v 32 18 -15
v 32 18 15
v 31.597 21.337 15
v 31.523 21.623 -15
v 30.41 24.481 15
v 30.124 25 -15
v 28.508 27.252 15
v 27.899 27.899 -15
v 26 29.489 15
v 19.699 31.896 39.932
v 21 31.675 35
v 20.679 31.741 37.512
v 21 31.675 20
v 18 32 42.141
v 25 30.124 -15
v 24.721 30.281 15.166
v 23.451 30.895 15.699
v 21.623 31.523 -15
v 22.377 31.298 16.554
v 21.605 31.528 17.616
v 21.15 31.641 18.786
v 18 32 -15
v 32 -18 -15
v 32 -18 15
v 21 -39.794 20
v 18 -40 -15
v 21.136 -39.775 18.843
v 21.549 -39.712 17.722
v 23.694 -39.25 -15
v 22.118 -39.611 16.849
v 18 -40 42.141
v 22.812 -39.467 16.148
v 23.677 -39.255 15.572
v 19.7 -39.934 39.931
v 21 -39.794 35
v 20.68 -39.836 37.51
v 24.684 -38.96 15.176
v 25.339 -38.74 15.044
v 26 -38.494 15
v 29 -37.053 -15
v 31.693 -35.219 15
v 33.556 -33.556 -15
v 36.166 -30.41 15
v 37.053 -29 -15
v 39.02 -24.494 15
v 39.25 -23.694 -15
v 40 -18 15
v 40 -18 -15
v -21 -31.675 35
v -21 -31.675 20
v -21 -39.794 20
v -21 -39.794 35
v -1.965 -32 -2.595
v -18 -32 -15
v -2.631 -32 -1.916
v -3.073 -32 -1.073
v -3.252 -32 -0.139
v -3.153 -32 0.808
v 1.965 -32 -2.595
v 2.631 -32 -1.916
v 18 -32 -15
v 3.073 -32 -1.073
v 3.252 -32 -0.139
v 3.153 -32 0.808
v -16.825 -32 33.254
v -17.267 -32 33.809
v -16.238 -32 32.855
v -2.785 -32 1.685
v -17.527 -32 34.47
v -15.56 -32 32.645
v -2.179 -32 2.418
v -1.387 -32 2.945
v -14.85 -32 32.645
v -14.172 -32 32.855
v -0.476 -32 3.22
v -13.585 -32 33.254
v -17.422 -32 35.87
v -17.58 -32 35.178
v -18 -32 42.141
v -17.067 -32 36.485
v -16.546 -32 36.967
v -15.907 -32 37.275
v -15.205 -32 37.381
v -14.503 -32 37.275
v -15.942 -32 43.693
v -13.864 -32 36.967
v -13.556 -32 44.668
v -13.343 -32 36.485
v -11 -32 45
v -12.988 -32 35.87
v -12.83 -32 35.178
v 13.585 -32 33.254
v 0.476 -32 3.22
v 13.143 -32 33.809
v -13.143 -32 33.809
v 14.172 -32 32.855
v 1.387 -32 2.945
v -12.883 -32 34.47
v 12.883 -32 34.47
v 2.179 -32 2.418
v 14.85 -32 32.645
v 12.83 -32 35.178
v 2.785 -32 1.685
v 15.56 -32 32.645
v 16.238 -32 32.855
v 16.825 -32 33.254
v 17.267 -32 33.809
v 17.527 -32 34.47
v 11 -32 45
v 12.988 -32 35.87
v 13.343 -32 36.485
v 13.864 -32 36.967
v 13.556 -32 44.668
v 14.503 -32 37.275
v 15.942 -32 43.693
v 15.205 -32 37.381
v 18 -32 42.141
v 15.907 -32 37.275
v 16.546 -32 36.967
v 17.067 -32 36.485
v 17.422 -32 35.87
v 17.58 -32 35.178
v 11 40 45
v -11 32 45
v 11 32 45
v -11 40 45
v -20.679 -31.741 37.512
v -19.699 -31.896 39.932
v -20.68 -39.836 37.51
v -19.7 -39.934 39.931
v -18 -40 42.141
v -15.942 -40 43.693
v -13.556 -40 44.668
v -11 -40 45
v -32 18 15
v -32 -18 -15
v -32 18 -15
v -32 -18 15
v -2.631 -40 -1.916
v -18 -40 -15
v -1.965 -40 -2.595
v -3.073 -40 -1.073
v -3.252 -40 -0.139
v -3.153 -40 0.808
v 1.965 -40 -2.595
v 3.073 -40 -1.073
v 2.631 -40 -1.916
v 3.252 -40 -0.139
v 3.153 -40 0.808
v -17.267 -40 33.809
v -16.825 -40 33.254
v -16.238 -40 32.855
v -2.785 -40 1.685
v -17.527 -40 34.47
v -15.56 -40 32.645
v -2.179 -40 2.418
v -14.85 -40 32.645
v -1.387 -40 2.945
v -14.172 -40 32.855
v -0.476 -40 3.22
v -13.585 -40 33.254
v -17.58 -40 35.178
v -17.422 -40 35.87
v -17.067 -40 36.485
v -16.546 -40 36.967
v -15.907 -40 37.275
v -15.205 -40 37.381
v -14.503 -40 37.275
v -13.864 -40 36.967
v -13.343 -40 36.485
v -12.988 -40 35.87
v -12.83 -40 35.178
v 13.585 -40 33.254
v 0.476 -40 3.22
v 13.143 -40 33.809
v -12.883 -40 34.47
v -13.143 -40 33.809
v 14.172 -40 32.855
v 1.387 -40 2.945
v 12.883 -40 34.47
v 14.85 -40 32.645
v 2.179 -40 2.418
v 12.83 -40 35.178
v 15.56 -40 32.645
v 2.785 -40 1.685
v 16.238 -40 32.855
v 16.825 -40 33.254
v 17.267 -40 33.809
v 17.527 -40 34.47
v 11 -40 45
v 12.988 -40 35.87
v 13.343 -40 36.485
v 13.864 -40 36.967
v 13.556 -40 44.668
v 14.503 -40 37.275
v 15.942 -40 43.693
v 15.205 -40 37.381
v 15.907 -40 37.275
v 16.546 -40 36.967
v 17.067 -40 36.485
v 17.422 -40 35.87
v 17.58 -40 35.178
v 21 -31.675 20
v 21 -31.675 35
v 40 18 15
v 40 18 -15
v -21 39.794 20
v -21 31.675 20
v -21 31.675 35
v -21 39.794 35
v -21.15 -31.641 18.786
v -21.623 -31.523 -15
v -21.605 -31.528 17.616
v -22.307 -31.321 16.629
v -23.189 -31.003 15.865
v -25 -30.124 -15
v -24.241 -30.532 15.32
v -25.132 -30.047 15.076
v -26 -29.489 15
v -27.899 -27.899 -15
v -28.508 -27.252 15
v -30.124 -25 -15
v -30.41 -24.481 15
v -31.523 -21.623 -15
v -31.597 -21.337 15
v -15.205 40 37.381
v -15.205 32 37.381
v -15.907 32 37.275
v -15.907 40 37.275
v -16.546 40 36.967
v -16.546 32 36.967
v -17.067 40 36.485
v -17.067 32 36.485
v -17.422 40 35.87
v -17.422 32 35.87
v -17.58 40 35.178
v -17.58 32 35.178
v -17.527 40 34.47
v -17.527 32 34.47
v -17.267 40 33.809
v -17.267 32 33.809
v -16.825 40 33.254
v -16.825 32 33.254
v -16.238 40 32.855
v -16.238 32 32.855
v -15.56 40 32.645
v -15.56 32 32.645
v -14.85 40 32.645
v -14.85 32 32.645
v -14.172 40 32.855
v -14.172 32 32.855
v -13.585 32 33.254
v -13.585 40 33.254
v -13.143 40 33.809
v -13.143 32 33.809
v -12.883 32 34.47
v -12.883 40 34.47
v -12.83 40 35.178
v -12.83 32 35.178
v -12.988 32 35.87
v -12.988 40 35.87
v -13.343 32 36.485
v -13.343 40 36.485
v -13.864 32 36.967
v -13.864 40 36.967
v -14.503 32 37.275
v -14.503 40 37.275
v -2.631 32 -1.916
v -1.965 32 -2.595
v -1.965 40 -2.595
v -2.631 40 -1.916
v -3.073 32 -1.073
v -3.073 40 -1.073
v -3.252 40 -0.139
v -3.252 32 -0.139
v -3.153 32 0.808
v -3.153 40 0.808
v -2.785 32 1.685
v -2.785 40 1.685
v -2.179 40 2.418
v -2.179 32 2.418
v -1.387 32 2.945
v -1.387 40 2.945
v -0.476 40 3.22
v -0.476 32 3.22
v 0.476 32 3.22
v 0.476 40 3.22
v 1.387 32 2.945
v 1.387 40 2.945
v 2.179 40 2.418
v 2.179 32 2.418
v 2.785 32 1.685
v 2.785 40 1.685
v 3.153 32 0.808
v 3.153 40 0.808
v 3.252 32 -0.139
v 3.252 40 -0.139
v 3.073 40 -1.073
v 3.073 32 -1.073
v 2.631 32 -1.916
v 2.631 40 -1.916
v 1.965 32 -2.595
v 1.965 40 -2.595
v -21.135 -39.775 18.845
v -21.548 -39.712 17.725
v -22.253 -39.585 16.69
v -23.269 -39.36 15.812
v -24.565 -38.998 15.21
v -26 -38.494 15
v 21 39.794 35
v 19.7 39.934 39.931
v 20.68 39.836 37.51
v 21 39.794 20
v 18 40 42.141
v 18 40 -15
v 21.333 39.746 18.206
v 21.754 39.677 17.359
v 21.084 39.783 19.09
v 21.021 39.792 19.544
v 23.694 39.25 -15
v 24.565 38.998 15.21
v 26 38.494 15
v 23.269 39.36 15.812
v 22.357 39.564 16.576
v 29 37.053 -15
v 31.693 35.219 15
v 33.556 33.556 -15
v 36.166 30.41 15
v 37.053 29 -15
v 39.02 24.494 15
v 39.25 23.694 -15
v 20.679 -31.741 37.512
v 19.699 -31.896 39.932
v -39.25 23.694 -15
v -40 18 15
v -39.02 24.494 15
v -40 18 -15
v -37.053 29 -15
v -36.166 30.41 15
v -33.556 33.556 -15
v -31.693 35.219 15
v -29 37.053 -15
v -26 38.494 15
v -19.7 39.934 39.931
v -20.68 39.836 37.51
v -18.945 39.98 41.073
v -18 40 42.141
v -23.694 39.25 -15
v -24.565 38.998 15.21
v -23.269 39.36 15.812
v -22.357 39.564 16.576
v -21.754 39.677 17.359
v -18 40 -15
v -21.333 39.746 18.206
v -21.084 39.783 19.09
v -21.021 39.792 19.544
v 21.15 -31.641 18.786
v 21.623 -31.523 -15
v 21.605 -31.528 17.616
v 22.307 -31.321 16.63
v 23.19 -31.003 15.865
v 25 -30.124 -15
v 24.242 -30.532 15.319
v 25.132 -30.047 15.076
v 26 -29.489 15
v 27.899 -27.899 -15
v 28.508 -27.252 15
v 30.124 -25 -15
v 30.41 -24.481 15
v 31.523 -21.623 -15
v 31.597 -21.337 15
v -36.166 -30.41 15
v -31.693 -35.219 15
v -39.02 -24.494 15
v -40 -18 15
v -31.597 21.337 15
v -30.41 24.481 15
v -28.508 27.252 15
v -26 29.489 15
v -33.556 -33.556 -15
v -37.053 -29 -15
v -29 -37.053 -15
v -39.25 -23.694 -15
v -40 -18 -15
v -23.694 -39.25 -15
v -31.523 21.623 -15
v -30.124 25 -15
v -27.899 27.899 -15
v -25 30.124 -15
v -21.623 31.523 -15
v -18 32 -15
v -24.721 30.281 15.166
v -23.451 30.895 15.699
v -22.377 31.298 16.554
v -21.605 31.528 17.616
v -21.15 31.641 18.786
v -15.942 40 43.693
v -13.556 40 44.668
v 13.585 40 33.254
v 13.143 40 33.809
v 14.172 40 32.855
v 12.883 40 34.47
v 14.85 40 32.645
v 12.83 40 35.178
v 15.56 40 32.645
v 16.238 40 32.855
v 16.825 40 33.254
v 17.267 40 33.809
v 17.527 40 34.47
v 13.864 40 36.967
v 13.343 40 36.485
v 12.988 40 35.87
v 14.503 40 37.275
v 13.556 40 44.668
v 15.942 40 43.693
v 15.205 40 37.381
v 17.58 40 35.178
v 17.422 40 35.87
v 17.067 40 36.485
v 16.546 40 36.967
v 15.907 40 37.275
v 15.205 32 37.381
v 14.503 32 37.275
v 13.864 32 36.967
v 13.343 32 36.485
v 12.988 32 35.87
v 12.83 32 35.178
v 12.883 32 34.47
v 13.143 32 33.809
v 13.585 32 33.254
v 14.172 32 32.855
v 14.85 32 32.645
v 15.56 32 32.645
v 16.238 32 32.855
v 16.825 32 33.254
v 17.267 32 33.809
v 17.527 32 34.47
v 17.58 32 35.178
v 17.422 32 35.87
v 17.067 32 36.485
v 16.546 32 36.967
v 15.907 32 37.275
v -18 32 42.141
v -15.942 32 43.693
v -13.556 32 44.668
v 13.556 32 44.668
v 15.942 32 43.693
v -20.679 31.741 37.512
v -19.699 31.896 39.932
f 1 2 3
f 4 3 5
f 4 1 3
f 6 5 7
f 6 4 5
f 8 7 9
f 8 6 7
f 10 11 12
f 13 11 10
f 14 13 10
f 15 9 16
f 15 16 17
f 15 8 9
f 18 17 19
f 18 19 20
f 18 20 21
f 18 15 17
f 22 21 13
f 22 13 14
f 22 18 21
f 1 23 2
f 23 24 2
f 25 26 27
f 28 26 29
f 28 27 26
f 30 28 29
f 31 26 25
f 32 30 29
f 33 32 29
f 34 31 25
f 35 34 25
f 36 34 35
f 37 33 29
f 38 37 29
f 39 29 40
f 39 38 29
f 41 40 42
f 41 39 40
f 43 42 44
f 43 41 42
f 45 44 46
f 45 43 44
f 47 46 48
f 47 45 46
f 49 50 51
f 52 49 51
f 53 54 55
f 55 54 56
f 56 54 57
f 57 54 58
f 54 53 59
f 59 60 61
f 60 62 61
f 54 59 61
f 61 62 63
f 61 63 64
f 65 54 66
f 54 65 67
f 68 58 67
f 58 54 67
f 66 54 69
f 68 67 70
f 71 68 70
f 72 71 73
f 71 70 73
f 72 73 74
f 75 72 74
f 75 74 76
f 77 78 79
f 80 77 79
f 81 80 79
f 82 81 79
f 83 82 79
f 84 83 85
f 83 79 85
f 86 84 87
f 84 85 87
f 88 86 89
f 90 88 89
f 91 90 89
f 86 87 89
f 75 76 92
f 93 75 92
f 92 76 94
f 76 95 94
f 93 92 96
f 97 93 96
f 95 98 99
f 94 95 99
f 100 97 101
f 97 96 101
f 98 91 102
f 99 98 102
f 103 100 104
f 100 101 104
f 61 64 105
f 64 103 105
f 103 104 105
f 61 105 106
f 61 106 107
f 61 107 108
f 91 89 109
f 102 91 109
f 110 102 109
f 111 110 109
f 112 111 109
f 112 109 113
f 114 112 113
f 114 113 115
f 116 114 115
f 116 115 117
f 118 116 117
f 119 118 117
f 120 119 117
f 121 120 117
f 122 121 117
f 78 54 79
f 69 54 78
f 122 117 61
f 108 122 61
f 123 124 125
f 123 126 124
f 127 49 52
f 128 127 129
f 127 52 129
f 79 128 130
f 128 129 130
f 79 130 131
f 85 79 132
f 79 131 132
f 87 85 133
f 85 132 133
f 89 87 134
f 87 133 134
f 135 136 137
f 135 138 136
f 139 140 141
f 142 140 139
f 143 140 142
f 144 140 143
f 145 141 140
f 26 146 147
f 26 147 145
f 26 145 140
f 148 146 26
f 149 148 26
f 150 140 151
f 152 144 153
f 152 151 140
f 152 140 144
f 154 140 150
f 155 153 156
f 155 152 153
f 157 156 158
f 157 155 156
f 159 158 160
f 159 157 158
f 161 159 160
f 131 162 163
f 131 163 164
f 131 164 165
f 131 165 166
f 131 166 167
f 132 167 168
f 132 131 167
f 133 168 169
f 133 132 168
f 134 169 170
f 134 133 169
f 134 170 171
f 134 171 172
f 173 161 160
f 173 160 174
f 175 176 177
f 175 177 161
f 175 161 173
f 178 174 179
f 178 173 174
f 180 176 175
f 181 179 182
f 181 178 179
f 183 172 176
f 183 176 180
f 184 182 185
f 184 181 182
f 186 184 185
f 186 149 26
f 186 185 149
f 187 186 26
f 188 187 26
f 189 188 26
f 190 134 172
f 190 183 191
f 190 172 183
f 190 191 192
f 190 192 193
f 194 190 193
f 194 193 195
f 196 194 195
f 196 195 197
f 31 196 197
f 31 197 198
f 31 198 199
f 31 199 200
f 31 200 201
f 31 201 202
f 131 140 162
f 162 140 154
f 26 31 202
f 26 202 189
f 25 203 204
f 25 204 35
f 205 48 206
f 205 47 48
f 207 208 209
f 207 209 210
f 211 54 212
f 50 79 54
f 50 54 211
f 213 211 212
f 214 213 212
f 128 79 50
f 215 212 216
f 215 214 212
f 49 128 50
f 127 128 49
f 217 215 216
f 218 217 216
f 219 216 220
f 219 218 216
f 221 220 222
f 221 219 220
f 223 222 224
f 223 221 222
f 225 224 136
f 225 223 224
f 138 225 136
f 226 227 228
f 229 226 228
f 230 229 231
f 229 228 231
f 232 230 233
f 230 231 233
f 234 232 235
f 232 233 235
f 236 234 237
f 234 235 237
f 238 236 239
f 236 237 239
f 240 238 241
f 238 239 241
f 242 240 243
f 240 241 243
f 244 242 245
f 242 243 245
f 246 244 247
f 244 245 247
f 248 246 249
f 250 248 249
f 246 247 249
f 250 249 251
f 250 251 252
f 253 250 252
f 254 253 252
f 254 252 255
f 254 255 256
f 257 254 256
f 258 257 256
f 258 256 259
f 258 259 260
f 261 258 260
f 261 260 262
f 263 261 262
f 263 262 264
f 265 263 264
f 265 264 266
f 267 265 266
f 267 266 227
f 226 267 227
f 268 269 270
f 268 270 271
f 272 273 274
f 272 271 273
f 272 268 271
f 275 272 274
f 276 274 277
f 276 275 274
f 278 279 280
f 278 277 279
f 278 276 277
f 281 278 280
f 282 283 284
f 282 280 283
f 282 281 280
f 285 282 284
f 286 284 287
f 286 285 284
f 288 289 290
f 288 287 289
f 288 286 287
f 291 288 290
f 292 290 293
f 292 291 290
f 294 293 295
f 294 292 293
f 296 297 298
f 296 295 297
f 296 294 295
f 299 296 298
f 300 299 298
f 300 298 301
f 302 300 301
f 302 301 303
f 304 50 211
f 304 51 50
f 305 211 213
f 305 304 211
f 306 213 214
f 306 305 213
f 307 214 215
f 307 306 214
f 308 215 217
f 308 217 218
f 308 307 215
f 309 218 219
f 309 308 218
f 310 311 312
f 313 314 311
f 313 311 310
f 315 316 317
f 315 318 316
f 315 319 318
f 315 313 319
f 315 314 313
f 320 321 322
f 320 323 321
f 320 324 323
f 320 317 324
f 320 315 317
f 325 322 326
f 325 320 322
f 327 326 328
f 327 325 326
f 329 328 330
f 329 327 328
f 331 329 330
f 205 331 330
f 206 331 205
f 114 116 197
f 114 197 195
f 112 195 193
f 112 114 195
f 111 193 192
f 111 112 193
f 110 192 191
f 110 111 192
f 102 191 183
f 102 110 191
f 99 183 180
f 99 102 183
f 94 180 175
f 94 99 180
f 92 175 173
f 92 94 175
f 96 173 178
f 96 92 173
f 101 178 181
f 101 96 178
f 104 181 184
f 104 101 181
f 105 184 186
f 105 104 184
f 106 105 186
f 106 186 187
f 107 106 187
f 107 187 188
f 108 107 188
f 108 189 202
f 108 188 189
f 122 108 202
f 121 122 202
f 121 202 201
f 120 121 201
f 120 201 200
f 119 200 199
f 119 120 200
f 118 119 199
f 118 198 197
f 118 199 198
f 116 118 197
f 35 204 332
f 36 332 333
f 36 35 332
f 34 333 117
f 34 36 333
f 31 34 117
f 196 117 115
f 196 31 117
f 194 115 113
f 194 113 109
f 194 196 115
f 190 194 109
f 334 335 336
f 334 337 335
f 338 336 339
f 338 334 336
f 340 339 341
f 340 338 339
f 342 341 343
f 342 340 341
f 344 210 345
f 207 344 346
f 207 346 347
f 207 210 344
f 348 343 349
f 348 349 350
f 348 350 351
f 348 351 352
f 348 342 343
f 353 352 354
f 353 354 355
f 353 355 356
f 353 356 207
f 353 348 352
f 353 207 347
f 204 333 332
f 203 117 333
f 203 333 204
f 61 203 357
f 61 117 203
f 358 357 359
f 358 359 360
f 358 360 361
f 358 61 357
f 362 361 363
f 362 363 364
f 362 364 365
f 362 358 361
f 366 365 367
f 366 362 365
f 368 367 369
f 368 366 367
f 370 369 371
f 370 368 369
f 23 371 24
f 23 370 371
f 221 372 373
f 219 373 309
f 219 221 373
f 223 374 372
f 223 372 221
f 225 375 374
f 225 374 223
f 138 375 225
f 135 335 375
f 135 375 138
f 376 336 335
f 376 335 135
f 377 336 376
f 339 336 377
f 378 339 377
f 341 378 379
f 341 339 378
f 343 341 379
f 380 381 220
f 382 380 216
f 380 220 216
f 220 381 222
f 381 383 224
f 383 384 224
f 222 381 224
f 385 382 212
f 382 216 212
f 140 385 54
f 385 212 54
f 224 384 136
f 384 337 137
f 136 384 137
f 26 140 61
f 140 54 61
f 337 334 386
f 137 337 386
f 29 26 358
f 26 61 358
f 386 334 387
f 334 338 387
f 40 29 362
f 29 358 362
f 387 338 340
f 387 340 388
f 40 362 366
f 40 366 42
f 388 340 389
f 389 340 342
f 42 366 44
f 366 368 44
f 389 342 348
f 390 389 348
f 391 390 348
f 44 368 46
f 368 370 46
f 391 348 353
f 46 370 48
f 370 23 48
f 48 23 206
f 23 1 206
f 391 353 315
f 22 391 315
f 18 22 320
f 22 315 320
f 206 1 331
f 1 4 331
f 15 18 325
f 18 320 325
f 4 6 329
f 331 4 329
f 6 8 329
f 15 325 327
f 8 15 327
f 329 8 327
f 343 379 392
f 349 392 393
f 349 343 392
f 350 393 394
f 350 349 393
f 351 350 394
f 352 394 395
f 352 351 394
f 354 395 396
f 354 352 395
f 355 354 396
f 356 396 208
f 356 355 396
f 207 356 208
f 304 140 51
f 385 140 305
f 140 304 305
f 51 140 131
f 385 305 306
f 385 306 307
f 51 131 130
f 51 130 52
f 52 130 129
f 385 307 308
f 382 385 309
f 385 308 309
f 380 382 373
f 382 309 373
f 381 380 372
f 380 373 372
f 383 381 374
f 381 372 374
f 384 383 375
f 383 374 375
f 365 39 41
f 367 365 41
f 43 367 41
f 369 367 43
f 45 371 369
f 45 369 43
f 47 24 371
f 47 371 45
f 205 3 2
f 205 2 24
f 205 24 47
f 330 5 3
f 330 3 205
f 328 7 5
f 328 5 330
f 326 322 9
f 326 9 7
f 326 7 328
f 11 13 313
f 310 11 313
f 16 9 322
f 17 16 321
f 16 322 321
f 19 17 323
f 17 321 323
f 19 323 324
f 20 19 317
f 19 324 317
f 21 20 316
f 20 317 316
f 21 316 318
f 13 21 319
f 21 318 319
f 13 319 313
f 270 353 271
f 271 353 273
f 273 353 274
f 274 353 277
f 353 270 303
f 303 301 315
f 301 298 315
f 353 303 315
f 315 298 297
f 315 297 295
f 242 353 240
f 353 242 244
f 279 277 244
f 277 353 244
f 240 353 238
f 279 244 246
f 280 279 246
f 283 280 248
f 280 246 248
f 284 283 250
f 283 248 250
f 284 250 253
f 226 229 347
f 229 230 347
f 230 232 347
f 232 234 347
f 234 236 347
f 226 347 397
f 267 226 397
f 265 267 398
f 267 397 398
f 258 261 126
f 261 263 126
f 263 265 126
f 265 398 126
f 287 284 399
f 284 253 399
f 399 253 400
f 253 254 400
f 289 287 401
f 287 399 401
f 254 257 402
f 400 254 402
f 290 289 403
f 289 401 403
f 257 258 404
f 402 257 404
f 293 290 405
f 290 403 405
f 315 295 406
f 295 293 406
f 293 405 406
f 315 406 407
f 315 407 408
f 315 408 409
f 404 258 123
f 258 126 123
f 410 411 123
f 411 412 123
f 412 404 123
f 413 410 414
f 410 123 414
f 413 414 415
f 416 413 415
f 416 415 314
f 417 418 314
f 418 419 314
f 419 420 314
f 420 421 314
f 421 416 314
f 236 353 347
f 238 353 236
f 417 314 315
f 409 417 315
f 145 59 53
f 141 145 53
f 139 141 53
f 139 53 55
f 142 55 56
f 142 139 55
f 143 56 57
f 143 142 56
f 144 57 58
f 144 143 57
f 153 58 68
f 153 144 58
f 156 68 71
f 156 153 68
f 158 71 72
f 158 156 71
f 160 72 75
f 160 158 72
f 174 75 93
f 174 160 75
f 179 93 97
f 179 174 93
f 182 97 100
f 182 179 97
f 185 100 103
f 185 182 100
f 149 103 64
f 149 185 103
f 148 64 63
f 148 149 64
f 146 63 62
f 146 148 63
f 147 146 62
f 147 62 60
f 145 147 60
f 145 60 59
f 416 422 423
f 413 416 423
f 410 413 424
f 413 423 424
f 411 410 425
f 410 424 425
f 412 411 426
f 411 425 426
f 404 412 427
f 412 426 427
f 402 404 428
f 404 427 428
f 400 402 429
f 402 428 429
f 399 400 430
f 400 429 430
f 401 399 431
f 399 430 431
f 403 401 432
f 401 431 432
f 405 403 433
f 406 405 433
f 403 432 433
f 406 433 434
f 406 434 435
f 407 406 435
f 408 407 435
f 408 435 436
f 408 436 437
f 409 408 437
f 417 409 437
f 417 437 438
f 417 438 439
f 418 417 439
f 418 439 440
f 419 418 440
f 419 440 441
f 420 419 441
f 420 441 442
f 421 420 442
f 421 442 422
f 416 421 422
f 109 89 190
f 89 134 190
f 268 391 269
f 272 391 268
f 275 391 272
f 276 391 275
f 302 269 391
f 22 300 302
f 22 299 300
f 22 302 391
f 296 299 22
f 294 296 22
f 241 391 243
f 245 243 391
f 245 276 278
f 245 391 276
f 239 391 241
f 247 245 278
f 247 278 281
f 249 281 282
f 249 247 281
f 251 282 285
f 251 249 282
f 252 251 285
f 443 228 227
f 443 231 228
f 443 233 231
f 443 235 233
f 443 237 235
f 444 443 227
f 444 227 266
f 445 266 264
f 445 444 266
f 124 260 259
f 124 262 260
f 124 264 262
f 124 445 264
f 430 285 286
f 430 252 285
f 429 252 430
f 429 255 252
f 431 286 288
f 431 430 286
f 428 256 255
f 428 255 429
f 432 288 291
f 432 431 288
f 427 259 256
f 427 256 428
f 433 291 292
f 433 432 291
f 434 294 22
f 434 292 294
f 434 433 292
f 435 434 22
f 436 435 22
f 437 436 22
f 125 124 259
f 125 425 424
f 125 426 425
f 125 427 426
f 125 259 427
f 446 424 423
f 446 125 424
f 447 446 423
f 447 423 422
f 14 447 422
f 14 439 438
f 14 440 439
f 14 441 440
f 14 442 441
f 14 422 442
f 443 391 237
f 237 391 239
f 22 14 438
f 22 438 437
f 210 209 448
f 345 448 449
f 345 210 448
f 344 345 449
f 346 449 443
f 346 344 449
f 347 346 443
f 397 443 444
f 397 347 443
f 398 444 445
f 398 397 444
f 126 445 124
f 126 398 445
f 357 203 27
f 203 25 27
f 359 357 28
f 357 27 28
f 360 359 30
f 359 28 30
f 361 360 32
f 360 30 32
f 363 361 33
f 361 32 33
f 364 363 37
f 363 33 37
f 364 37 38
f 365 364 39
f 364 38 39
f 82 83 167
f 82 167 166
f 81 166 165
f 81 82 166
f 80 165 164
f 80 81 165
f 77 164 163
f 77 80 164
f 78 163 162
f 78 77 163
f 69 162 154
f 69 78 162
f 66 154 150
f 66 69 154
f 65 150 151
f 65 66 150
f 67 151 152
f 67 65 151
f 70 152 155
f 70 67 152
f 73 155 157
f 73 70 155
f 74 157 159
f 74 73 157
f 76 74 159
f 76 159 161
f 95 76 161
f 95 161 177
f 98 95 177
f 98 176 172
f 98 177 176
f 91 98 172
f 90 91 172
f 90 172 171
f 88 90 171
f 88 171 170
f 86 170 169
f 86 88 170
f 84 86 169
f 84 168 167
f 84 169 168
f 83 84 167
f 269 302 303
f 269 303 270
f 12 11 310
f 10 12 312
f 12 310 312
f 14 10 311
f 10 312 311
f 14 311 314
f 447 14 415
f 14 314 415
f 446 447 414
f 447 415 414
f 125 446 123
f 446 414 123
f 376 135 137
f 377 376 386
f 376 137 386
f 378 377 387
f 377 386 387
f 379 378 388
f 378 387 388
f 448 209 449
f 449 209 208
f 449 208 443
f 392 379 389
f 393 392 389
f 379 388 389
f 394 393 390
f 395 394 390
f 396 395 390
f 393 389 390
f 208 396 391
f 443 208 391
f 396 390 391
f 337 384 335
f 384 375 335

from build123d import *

# Parameters (mm, degrees)
ESQUISSE1_W                             = 80
ESQUISSE1_H                             = 80
ESQUISSE1_W_2                           = 64
ESQUISSE1_H_2                           = 64
BOSS_EXTRU_1_DEPTH                      = 15
ESQUISSE7_W                             = 42
ESQUISSE7_H                             = 8
BOSS_EXTRU_4_DEPTH                      = 30
PER_AGE_POUR_CROUS_AUTO_BLOQUANTS_300_D = 4.7625
CONG_1_R                                = 10
CONG_1_OF_SYM_TRIE2_R                   = 10
CONG_2_R                                = 22
CONG_3_R                                = 14
CONG_4_R                                = 5
ENL_V_MAT_EXTRU_3_DEPTH                 = 124.389626959


with BuildPart() as part:
    # Esquisse1 → Boss.-Extru.1 (new, symmetric)
    with BuildSketch(Plane.XY):
        Rectangle(ESQUISSE1_W, ESQUISSE1_H)
        Rectangle(ESQUISSE1_W_2, ESQUISSE1_H_2, mode=Mode.SUBTRACT)
    extrude(amount=BOSS_EXTRU_1_DEPTH, both=True)

    # Esquisse7 → Boss.-Extru.4 (add)
    with BuildSketch(Plane.XY.offset(15)):
        with Locations((0, 36)):
            Rectangle(ESQUISSE7_W, ESQUISSE7_H)
    boss_extru_4 = extrude(amount=BOSS_EXTRU_4_DEPTH)

    # Perçage pour écrous auto-bloquants 300® #6 (SP)1 (through all)
    with Locations(Plane(origin=(0, 40, 0), x_dir=(0, 0, -1), z_dir=(0, 1, 0))):
        with Locations((-35, -15.205), (-35, 15.205)):
            per_age_pour_crous_auto_bloquants_300 = Hole(PER_AGE_POUR_CROUS_AUTO_BLOQUANTS_300_D / 2)

    # Congé1
    cong_1_edges = [part.edges().sort_by_distance(p)[0] for p in [
        (21, 36, 45),
        (-21, 36, 45),
    ]]
    fillet(cong_1_edges, radius=CONG_1_R)

    # Symétrie2: Boss.-Extru.4, Perçage pour écrous auto-bloquants 300® #6 (SP)1 across plane
    add(boss_extru_4.mirror(Plane.ZX))
    add(per_age_pour_crous_auto_bloquants_300.mirror(Plane.ZX), mode=Mode.SUBTRACT)

    # Congé1 of Symétrie2
    cong_1_of_sym_trie2_edges = [part.edges().sort_by_distance(p)[0] for p in [
        (21, -36, 45),
        (-21, -36, 45),
    ]]
    fillet(cong_1_of_sym_trie2_edges, radius=CONG_1_OF_SYM_TRIE2_R)

    # Congé2
    cong_2_edges = [part.edges().sort_by_distance(p)[0] for p in [
        (40, -40, 0),
        (-40, -40, 0),
        (-40, 40, 0),
        (40, 40, 0),
    ]]
    fillet(cong_2_edges, radius=CONG_2_R)

    # Congé3
    cong_3_edges = [part.edges().sort_by_distance(p)[0] for p in [
        (-32, 32, 0),
        (-32, -32, 0),
        (32, -32, 0),
        (32, 32, 0),
    ]]
    fillet(cong_3_edges, radius=CONG_3_R)

    # Congé4
    cong_4_edges = [part.edges().sort_by_distance(p)[0] for p in [
        (-21, -35.734644524, 15),
        (-21, 35.734644524, 15),
        (21, 35.734644524, 15),
        (21, -35.734644524, 15),
    ]]
    fillet(cong_4_edges, radius=CONG_4_R)

    # Esquisse11 → Enlèv. mat.-Extru.3 (cut, through all)
    with BuildSketch(Plane(origin=(0, -40, -40), x_dir=(1, 0, 0), z_dir=(0, 1, 0))):
        with BuildLine():
            Line((1.964942747, -37.405), (-1.964942747, -37.405))
            ThreePointArc((-1.964942747, -37.405), (0, -43.255), (1.964942747, -37.405))
        make_face()
    extrude(amount=ENL_V_MAT_EXTRU_3_DEPTH, mode=Mode.SUBTRACT)


solid = part.part
